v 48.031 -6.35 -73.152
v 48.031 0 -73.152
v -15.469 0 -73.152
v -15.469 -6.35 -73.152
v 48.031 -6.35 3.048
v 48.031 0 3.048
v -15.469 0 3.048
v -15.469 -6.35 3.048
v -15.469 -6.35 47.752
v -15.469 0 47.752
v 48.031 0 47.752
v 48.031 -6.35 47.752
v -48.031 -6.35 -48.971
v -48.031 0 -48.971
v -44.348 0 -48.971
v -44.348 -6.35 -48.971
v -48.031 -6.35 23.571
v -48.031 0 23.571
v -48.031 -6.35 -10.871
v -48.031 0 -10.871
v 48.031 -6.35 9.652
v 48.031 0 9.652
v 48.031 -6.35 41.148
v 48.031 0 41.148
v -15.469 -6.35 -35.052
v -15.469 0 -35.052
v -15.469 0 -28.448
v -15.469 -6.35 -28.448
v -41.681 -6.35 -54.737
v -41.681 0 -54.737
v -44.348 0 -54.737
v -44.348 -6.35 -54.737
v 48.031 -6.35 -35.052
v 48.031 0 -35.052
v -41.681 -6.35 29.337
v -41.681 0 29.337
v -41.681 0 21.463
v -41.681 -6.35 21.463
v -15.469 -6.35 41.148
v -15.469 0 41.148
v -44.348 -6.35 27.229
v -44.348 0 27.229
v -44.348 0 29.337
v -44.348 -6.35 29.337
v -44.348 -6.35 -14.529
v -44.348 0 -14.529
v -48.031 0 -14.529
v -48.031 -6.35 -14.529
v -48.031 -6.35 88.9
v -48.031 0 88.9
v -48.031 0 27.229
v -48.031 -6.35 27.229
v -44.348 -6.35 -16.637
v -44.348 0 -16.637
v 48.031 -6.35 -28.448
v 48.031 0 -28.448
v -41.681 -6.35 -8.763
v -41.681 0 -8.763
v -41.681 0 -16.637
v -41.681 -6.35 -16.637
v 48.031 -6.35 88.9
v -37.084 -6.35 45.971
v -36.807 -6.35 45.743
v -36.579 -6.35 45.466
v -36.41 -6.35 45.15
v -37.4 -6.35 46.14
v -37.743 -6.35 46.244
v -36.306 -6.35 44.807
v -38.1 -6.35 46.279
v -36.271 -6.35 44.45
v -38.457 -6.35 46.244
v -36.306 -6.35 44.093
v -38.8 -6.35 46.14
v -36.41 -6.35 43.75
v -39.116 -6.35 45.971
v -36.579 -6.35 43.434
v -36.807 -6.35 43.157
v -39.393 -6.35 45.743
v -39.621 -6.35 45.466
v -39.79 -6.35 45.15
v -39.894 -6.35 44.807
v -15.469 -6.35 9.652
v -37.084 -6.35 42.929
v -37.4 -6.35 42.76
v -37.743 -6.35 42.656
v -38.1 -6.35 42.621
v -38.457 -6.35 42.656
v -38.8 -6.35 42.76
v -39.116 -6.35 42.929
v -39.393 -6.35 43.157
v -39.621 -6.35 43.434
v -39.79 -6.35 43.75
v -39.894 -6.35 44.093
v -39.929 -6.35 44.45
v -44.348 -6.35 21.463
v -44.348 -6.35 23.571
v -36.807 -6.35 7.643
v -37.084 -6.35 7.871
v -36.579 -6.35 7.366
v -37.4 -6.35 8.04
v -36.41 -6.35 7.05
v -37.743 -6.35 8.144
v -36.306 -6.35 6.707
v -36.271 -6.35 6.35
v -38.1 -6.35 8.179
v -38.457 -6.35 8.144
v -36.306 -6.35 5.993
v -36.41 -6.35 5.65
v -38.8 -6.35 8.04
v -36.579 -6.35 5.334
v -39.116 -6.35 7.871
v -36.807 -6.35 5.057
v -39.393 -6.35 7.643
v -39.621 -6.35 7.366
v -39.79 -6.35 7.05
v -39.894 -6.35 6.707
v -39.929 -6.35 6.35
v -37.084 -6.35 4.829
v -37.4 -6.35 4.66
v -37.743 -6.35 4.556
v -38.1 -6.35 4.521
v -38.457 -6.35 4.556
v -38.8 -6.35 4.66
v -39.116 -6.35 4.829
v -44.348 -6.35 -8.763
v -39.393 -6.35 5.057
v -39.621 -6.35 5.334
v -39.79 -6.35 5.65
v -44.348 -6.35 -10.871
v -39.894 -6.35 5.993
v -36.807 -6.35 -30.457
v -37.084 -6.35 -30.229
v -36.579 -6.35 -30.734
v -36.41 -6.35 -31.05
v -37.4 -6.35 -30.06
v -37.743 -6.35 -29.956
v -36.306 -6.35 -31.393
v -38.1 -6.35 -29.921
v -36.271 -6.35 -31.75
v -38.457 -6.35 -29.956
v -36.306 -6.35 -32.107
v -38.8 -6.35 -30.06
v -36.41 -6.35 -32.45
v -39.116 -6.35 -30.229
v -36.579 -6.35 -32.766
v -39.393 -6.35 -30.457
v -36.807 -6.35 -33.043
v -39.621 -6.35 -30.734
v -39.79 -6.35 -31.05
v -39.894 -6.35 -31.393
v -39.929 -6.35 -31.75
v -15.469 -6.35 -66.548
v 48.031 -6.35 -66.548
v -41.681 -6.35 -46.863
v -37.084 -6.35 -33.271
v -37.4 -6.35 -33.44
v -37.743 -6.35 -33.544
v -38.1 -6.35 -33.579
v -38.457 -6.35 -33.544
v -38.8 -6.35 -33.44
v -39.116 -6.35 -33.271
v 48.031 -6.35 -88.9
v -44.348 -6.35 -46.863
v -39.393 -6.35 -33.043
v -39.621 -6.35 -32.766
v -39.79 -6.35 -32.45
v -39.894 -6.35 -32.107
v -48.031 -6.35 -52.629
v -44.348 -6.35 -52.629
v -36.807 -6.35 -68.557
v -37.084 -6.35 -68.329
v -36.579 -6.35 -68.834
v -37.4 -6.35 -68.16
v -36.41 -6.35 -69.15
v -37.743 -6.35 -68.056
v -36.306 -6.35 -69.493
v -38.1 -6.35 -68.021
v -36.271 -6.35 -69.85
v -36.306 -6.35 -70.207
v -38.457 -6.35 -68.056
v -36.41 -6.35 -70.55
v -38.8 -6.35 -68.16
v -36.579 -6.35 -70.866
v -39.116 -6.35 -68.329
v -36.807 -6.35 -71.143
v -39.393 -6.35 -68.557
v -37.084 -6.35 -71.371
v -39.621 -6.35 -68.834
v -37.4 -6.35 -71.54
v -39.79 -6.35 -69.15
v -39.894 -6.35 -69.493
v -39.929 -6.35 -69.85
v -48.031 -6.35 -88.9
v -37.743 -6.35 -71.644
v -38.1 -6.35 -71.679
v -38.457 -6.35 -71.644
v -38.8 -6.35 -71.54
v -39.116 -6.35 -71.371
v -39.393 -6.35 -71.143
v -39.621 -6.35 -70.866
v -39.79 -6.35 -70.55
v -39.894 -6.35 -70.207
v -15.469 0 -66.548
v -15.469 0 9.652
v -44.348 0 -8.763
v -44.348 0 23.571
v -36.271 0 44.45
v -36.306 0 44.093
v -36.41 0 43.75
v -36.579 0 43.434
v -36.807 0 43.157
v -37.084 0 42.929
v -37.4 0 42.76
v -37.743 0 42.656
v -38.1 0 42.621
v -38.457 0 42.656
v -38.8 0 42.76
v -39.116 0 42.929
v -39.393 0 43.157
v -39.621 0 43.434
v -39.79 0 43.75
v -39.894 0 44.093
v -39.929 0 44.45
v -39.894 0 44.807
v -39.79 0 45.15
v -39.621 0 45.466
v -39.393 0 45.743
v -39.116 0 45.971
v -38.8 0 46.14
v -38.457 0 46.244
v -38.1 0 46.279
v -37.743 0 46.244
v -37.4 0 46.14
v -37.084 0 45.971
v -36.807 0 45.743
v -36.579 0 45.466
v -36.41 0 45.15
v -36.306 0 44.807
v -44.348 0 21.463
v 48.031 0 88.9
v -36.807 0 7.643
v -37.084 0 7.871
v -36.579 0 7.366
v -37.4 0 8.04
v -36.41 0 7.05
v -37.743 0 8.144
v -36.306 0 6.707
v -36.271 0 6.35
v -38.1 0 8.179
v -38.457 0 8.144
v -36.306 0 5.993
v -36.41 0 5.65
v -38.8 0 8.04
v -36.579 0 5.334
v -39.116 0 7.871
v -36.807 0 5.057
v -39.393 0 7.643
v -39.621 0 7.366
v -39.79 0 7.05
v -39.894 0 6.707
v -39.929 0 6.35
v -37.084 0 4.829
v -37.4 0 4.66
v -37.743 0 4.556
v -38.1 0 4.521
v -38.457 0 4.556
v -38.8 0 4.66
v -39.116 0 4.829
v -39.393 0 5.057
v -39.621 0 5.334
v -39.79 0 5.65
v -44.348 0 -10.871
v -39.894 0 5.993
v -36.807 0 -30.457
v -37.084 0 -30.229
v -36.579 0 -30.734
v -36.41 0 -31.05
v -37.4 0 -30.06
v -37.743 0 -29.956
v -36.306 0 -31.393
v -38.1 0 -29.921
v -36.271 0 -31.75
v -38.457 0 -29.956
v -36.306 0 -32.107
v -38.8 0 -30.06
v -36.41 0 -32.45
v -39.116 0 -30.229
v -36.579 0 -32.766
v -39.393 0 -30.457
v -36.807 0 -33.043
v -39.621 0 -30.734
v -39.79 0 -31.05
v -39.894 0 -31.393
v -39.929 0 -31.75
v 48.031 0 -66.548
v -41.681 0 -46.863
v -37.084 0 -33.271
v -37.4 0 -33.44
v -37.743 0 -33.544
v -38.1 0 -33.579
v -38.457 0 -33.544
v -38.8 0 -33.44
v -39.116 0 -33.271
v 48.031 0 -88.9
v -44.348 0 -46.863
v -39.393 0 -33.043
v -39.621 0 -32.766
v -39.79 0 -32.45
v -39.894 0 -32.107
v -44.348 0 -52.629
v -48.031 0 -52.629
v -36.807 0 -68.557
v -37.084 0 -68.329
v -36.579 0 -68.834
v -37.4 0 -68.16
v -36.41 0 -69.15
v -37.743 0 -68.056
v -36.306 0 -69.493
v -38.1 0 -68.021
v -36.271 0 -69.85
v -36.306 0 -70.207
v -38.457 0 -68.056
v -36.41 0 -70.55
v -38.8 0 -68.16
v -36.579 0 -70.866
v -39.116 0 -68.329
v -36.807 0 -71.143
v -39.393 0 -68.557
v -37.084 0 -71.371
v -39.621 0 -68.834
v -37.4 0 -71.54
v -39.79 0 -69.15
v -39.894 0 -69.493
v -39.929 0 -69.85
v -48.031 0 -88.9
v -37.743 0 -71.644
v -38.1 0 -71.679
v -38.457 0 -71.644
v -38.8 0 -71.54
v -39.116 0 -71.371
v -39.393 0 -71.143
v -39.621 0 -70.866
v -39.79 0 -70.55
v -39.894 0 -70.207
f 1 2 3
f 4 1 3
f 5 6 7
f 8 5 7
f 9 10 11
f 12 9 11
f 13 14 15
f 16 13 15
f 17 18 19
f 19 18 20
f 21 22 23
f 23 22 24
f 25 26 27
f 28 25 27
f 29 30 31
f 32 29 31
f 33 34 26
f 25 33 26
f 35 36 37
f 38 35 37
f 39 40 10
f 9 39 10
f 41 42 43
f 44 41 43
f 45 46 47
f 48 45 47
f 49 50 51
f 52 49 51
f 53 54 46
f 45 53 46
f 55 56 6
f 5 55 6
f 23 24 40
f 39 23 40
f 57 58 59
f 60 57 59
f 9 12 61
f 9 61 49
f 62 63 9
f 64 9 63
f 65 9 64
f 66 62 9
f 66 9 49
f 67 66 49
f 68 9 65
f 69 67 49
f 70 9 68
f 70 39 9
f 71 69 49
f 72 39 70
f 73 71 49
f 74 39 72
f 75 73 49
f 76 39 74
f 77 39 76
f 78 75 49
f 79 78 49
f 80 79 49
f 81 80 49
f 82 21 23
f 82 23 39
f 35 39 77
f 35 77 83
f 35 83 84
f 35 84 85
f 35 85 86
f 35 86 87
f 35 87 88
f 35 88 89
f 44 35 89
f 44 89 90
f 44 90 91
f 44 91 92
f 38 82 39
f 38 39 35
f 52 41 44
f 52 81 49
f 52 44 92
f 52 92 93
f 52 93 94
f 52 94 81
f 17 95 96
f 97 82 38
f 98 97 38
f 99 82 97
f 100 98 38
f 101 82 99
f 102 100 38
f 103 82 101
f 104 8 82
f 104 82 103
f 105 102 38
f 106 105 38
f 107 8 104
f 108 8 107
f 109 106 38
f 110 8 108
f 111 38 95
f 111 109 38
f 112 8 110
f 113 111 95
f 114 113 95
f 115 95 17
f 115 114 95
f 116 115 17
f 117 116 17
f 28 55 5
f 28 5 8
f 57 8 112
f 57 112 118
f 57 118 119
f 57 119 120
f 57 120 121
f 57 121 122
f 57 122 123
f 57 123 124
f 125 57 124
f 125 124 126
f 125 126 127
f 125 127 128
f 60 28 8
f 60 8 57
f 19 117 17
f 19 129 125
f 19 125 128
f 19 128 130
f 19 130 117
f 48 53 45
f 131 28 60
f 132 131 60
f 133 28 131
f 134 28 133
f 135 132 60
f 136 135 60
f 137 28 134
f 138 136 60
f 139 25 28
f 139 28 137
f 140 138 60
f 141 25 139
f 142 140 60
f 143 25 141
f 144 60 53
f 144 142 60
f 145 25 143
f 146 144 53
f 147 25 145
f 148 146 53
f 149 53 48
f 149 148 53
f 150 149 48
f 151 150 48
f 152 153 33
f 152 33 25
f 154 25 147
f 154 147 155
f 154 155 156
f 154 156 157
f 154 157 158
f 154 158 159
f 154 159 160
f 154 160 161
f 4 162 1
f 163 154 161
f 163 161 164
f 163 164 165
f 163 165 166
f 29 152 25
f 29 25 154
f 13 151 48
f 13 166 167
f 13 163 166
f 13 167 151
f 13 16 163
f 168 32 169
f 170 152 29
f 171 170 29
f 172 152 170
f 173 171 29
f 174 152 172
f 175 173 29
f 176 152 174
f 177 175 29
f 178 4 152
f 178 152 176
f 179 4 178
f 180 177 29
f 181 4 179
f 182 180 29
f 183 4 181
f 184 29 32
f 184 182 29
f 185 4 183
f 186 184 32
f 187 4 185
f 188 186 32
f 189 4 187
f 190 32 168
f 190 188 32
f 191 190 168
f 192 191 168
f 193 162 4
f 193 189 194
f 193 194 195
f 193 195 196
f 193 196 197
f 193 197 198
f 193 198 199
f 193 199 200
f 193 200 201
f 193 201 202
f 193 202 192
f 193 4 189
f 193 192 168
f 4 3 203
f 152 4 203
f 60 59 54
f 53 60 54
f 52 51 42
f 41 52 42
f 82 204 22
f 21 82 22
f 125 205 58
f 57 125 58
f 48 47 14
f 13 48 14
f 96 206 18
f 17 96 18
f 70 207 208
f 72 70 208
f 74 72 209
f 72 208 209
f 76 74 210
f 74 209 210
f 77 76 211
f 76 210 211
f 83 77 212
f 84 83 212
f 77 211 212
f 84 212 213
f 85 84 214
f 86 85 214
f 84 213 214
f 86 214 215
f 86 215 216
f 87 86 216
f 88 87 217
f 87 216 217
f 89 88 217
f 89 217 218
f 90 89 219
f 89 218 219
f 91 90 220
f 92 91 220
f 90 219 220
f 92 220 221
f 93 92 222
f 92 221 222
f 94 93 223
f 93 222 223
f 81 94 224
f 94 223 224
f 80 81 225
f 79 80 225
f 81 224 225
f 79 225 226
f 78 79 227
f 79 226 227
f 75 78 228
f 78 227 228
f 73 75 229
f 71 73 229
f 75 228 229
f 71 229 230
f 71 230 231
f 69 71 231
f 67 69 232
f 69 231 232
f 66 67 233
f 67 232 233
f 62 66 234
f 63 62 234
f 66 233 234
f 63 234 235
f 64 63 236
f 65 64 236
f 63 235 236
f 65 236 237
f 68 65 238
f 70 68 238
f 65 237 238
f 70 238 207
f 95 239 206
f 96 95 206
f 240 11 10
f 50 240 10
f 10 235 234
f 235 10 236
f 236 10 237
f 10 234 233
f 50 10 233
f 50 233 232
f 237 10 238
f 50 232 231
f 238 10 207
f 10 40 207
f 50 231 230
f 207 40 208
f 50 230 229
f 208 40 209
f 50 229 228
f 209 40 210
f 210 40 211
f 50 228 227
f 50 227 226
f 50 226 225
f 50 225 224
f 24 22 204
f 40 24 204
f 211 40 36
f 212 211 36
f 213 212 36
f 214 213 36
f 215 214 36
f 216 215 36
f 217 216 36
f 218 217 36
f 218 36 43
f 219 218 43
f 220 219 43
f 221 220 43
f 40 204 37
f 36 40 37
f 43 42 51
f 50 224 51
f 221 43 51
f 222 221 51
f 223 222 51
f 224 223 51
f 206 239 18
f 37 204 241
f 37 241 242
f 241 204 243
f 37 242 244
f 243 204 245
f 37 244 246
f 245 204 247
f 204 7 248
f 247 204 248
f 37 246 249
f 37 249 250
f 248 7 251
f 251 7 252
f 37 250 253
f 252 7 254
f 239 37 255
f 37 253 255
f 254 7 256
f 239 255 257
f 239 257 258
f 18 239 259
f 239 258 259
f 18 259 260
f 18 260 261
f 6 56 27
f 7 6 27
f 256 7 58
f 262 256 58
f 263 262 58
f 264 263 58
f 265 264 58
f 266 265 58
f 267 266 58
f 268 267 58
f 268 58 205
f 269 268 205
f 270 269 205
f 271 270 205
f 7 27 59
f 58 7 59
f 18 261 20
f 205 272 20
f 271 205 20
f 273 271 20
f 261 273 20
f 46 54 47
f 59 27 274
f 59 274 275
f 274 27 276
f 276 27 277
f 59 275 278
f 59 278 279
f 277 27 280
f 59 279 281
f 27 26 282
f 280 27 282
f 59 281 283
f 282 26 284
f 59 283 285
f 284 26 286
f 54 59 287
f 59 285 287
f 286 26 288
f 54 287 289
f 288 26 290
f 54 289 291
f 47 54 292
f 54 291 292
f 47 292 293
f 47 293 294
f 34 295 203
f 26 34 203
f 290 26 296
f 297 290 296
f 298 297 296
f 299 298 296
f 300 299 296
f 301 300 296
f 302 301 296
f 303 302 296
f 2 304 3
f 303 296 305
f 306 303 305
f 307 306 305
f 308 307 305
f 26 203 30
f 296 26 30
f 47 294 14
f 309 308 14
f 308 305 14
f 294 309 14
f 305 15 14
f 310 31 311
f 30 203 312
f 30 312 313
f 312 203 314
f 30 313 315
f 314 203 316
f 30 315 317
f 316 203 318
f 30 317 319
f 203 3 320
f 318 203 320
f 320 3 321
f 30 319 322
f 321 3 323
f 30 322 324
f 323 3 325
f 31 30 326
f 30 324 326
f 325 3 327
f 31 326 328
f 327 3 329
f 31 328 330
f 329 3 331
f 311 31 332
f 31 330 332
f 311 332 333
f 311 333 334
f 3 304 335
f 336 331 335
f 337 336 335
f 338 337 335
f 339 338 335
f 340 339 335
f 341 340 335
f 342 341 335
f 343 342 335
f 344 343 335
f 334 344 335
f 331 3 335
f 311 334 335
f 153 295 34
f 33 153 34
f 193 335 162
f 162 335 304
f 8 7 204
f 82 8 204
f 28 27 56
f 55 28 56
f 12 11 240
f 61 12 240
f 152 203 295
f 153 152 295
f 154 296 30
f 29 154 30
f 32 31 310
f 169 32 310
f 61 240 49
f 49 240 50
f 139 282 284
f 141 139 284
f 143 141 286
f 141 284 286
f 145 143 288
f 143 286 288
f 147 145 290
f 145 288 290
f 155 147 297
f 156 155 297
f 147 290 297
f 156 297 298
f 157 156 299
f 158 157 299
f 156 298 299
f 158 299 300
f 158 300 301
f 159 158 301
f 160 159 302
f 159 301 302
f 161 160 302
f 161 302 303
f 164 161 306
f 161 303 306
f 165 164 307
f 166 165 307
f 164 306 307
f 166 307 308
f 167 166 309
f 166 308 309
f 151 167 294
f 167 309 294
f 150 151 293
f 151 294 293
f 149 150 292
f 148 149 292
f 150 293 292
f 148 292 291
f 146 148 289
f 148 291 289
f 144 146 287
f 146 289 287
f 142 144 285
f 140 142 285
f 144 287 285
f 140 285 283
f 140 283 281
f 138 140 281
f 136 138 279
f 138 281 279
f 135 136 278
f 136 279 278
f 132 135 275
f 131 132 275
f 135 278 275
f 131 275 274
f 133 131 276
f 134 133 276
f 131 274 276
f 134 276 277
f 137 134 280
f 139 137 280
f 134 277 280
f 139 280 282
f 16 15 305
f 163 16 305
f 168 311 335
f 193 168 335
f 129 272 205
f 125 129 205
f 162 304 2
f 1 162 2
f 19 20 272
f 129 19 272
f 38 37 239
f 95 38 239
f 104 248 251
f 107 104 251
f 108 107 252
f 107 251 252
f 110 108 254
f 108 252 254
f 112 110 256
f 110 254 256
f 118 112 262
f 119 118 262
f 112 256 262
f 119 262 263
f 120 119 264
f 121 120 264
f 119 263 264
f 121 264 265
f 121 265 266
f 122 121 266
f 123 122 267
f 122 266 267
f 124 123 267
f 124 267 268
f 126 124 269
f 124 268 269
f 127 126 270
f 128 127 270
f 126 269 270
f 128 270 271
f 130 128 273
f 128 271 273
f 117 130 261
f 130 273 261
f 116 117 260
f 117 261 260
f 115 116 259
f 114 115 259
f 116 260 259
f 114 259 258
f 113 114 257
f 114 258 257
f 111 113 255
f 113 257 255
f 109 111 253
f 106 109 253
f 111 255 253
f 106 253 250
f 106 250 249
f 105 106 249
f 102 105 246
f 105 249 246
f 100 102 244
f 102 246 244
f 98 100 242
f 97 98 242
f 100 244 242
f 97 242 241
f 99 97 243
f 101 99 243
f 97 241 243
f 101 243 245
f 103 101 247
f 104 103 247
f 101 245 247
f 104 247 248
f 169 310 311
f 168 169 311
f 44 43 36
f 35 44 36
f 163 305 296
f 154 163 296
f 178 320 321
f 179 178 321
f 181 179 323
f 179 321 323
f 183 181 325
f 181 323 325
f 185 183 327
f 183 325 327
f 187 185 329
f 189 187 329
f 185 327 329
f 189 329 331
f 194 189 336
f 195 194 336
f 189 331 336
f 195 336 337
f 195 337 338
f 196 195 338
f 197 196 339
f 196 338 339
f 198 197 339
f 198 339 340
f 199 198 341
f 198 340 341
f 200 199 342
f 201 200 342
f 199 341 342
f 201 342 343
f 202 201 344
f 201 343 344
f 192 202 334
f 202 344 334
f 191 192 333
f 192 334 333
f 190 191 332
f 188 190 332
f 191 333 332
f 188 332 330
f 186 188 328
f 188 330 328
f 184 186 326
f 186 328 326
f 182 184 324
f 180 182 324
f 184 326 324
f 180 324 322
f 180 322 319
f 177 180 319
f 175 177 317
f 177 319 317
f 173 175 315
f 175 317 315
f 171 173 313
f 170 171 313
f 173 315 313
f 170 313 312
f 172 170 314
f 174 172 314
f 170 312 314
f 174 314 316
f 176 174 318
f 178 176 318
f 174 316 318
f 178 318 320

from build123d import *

# Parameters (mm, degrees)
SKETCH1_R           = 1.8288
BOSS_EXTRUDE1_DEPTH = 6.35


with BuildPart() as part:
    # Sketch1 → Boss-Extrude1 (new body)
    with BuildSketch(Plane(origin=(0, 0, 0), x_dir=(1, 0, 0), z_dir=(0, 1, 0))):
        Polygon((-48.0314, 88.9), (48.0314, 88.9), (48.0314, 73.152), (-15.4686, 73.152), (-15.4686, 66.548), (48.0314, 66.548), (48.0314, 35.052), (-15.4686, 35.052), (-15.4686, 28.448), (48.0314, 28.448), (48.0314, -3.048), (-15.4686, -3.048), (-15.4686, -9.652), (48.0314, -9.652), (48.0314, -41.148), (-15.4686, -41.148), (-15.4686, -47.752), (48.0314, -47.752), (48.0314, -88.9), (-48.0314, -88.9), (-48.0314, -27.2288), (-44.3484, -27.2288), (-44.3484, -29.337), (-41.6814, -29.337), (-41.6814, -21.463), (-44.3484, -21.463), (-44.3484, -23.5712), (-48.0314, -23.5712), (-48.0314, 10.8712), (-44.3484, 10.8712), (-44.3484, 8.763), (-41.6814, 8.763), (-41.6814, 16.637), (-44.3484, 16.637), (-44.3484, 14.5288), (-48.0314, 14.5288), (-48.0314, 48.9712), (-44.3484, 48.9712), (-44.3484, 46.863), (-41.6814, 46.863), (-41.6814, 54.737), (-44.3484, 54.737), (-44.3484, 52.6288), (-48.0314, 52.6288), align=None)
        with Locations((-38.1, 69.85)):
            Circle(SKETCH1_R, mode=Mode.SUBTRACT)
        with Locations((-38.1, 31.75)):
            Circle(SKETCH1_R, mode=Mode.SUBTRACT)
        with Locations((-38.1, -6.35)):
            Circle(SKETCH1_R, mode=Mode.SUBTRACT)
        with Locations((-38.1, -44.45)):
            Circle(SKETCH1_R, mode=Mode.SUBTRACT)
    extrude(amount=-BOSS_EXTRUDE1_DEPTH)


solid = part.part
